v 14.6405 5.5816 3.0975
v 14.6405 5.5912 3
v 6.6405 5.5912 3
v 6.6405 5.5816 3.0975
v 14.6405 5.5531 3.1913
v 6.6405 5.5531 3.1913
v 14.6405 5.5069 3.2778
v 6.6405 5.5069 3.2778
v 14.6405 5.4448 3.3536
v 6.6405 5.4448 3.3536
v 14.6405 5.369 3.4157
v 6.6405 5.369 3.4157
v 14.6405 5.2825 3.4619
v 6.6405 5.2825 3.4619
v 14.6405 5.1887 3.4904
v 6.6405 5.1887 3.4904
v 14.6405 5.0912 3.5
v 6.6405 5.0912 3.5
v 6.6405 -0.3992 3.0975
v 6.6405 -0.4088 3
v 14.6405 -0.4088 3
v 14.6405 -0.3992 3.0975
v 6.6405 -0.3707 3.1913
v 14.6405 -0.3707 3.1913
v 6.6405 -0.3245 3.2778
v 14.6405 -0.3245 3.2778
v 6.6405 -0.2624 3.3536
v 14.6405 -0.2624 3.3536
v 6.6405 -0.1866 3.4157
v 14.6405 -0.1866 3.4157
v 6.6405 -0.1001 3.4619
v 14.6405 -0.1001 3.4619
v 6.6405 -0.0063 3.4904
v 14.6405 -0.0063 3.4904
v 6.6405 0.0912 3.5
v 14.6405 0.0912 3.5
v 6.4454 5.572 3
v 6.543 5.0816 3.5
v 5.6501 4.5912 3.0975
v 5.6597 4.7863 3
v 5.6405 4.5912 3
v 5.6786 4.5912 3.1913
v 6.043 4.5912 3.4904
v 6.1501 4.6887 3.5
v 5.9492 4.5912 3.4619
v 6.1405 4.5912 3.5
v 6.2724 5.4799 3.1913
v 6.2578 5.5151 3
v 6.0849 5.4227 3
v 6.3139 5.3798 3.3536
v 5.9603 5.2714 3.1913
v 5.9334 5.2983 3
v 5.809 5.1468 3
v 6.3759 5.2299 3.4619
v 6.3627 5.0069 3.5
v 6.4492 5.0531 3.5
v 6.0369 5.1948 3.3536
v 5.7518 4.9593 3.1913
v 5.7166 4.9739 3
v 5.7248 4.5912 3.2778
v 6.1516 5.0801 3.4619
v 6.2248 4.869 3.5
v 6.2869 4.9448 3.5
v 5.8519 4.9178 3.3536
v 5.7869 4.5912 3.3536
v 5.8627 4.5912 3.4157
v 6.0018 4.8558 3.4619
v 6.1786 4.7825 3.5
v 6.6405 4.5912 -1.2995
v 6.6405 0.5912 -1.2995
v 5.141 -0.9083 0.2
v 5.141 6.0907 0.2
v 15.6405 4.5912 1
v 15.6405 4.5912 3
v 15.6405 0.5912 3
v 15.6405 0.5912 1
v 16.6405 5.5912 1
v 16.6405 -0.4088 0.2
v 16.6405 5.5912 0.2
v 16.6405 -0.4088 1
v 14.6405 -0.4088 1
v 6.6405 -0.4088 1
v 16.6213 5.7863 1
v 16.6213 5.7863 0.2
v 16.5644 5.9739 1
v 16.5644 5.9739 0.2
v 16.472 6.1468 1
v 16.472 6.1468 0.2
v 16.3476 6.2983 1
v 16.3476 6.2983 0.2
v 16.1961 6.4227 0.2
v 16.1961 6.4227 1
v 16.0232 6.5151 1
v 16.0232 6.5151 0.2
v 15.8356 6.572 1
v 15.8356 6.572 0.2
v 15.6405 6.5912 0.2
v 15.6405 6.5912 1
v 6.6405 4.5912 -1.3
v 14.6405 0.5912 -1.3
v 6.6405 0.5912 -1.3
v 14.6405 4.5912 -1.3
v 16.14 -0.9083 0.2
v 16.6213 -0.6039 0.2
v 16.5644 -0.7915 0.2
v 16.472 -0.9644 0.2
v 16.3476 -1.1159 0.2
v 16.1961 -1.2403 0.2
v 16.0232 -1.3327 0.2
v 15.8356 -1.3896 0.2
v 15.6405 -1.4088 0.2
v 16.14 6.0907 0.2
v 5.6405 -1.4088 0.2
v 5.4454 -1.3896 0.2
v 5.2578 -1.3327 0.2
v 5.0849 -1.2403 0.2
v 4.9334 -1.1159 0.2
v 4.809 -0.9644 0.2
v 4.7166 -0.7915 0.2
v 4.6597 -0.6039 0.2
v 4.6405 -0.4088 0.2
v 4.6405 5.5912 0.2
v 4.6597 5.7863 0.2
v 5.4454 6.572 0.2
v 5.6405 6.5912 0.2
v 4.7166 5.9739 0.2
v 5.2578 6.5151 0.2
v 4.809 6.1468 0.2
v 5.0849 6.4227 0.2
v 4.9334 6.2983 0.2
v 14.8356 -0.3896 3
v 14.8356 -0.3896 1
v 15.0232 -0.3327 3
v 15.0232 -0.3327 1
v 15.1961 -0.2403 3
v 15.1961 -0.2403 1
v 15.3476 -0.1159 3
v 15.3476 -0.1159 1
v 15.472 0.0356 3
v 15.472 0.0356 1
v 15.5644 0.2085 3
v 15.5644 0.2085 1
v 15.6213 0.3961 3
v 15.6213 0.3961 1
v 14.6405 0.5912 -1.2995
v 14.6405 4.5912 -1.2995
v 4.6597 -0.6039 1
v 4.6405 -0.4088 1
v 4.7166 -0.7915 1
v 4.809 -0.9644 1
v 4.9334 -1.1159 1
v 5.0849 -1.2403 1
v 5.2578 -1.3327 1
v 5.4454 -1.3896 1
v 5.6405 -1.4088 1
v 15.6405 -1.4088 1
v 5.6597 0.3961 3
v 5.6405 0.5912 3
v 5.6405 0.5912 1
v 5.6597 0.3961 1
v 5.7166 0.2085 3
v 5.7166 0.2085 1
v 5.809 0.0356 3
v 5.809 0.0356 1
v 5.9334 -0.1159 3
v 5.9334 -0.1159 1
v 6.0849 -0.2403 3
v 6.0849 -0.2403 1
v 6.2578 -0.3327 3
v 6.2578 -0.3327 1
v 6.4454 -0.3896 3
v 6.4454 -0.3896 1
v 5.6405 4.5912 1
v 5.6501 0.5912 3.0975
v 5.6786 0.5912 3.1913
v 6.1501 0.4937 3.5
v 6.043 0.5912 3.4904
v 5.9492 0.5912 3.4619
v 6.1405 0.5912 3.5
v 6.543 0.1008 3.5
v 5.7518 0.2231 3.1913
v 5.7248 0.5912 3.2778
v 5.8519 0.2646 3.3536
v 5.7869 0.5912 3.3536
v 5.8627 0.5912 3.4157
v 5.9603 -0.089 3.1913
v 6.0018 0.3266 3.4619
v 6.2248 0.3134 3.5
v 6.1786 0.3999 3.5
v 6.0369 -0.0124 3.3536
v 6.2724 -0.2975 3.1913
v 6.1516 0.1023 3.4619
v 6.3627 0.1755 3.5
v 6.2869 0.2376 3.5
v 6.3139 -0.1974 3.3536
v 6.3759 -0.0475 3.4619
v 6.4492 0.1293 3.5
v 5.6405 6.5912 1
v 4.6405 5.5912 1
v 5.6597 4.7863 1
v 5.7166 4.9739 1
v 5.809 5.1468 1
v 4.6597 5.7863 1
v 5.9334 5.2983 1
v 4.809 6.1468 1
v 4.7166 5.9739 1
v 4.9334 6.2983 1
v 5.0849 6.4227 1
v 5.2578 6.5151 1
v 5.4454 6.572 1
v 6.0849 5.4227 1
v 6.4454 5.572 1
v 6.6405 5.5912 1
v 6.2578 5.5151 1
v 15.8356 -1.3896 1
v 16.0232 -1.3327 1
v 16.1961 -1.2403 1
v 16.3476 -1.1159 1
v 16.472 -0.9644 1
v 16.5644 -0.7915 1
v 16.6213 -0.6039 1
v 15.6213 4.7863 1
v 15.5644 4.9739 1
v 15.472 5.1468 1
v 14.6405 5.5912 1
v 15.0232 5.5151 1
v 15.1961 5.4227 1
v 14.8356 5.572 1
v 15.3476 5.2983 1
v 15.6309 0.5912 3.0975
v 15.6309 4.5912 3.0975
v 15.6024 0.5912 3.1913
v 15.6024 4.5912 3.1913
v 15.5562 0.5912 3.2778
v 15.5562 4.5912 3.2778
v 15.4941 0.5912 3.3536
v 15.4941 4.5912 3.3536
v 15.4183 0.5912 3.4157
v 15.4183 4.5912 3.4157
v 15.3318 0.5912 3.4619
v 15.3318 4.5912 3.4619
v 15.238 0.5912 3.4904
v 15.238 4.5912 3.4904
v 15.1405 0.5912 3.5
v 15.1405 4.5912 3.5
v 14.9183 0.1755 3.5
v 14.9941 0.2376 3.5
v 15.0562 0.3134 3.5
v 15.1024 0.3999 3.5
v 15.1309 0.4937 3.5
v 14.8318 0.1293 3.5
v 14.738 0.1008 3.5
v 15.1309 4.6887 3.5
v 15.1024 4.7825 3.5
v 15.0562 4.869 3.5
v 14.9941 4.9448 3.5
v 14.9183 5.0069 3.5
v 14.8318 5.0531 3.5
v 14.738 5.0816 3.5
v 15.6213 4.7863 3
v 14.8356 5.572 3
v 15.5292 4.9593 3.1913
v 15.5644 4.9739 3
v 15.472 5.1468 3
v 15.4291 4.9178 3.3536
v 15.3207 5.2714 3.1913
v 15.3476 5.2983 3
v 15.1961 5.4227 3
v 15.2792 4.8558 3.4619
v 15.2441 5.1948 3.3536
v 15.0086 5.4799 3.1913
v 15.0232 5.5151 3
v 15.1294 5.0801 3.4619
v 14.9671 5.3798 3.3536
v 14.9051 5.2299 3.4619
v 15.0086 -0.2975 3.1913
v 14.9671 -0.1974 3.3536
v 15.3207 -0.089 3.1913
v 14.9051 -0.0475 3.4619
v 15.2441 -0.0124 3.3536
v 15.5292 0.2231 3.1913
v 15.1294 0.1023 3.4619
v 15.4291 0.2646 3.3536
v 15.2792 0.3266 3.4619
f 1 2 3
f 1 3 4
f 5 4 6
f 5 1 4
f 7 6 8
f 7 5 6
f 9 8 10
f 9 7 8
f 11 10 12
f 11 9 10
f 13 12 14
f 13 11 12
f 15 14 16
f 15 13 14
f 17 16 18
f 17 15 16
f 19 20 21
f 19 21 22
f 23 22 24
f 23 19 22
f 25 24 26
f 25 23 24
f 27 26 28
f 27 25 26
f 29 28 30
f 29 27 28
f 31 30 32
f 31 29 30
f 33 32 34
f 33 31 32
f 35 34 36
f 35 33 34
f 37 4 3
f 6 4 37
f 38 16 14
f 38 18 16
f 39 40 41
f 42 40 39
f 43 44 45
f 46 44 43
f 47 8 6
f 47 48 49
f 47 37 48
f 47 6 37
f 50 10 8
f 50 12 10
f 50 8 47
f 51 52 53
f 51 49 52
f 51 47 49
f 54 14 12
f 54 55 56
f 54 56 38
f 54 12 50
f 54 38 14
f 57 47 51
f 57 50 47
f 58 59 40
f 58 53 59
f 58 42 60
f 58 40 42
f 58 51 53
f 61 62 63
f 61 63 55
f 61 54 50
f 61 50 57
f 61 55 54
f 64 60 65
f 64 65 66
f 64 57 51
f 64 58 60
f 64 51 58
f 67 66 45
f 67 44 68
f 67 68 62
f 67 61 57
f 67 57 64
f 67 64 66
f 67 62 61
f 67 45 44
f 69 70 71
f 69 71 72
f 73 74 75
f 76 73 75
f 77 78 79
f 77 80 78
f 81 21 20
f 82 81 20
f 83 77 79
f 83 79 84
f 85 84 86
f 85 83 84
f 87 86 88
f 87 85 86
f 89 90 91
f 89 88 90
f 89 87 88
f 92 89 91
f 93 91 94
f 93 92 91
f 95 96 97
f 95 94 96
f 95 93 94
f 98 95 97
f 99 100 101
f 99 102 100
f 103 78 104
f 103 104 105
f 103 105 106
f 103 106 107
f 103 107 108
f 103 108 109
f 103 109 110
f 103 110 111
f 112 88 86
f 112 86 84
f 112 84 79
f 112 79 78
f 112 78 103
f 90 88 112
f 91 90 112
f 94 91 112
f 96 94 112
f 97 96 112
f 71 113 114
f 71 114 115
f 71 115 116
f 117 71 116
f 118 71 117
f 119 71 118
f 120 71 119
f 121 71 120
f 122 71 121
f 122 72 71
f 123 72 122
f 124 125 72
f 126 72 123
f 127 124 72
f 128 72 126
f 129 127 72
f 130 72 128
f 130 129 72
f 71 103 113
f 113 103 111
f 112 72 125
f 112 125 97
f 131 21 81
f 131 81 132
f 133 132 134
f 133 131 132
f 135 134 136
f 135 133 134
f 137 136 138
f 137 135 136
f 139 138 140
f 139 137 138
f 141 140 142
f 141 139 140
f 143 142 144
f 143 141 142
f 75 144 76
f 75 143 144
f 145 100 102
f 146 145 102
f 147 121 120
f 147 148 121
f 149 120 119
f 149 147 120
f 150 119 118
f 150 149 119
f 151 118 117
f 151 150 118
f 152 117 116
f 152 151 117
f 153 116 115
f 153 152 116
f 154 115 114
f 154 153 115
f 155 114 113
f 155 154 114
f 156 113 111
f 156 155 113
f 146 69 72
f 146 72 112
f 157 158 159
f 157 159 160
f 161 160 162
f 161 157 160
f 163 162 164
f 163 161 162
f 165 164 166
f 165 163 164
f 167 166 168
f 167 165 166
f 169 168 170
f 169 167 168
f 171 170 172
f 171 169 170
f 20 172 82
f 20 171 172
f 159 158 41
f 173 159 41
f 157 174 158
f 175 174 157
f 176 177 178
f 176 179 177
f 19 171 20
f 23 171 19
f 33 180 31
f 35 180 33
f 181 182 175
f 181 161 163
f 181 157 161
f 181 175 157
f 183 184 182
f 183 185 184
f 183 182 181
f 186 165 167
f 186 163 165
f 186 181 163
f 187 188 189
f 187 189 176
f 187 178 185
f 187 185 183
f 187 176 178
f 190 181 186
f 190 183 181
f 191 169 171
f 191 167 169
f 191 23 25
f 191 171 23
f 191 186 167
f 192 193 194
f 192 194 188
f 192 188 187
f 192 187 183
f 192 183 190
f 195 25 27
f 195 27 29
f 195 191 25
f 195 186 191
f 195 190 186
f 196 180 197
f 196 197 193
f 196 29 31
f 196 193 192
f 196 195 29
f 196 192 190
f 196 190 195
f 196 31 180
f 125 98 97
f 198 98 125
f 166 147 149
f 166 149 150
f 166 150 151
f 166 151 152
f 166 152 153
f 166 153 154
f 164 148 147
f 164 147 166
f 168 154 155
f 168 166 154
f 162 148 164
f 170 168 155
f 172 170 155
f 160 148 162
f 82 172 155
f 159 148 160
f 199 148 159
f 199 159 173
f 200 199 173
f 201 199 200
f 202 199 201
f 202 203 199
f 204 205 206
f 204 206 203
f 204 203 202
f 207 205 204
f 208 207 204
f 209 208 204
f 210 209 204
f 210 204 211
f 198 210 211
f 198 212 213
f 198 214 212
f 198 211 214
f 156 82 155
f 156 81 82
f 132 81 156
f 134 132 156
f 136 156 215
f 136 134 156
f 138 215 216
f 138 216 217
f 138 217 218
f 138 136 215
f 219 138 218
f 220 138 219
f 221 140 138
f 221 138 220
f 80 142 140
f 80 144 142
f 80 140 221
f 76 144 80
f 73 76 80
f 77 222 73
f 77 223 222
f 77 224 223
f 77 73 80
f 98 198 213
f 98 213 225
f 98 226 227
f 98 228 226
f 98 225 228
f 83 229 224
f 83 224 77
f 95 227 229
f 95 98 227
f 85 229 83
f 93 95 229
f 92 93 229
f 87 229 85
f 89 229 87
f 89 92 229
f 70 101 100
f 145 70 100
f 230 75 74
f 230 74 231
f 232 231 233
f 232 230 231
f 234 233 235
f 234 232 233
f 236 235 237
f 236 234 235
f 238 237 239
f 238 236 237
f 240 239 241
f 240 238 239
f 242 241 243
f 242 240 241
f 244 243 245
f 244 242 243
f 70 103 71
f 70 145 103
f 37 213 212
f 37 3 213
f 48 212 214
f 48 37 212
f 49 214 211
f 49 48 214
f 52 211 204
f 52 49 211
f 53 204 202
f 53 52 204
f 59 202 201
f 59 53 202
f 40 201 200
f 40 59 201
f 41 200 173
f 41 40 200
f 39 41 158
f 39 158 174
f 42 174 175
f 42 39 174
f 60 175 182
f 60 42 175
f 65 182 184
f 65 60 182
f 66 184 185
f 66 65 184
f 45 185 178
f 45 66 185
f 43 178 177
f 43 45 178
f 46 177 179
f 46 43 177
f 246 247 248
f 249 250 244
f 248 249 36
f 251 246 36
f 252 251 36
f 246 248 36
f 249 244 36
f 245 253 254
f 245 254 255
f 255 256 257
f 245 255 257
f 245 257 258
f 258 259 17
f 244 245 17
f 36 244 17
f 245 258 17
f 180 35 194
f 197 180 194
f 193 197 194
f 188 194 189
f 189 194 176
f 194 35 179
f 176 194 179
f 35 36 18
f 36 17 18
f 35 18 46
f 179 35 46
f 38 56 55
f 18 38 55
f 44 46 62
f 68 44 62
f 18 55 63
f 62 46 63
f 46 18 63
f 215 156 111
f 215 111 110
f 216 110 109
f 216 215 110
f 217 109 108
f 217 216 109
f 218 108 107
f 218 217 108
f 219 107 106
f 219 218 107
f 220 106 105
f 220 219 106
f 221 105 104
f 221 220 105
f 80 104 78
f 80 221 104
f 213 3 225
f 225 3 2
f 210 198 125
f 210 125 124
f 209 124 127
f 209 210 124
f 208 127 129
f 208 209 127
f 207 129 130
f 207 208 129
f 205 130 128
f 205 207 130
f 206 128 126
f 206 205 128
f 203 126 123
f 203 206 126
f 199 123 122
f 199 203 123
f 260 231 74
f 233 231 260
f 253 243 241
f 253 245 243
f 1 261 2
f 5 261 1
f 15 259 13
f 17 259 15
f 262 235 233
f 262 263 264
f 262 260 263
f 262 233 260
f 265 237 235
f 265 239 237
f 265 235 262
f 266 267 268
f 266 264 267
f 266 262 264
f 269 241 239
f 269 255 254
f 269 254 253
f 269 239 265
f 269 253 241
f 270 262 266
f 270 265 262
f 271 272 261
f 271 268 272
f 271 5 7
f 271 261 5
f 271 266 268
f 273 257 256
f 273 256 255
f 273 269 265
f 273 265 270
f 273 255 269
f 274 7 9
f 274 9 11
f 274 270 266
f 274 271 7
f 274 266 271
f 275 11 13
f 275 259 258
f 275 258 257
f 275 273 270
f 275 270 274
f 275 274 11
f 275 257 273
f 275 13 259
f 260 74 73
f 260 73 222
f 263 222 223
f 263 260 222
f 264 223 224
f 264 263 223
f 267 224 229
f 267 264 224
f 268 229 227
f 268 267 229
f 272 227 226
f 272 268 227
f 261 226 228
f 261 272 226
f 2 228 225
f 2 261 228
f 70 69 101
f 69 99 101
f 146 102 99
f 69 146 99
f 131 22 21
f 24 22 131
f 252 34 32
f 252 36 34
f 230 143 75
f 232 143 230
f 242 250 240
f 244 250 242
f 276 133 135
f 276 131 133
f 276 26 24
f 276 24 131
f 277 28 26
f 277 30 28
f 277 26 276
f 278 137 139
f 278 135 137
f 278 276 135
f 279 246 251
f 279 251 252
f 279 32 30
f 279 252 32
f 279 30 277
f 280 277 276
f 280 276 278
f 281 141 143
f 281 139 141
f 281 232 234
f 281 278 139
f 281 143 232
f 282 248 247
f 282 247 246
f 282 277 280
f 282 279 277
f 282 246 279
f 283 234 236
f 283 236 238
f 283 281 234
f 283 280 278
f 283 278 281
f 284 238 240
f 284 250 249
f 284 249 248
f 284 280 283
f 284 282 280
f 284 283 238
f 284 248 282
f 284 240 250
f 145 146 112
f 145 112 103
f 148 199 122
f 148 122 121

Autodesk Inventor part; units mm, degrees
ref_plane "YZ Plane" through (0, 0, 0) normal (1, 0, 0) x (0, 1, 0)
ref_plane "XZ Plane" through (0, 0, 0) normal (0, 1, 0) x (-1, 0, 0)
ref_plane "XY Plane" through (0, 0, 0) normal (0, 0, 1) x (1, 0, 0)
sketch "Sketch1" plane through (0, 0, 0) normal (0, 0, 1) x (1, 0, 0)
  circle A0 centre (10.6405, 2.5912) radius 4
  line L0 (15.6405, 6.5912) -> (5.6405, 6.5912)
  line L1 (4.6405, 5.5912) -> (4.6405, -0.4088)
  line L2 (5.6405, -1.4088) -> (15.6405, -1.4088)
  line L3 (16.6405, -0.4088) -> (16.6405, 5.5912)
  line L4 (16.6405, 6.5912) -> (4.6405, -1.4088) construction
  line L5 (4.6405, 6.5912) -> (16.6405, -1.4088) construction
  arc A1 (5.6405, 6.5912) -> (4.6405, 5.5912) centre (5.6405, 5.5912) ccw
  arc A2 (4.6405, -0.4088) -> (5.6405, -1.4088) centre (5.6405, -0.4088) ccw
  arc A3 (15.6405, -1.4088) -> (16.6405, -0.4088) centre (15.6405, -0.4088) ccw
  arc A4 (16.6405, 5.5912) -> (15.6405, 6.5912) centre (15.6405, 5.5912) ccw
  point P0 (0, 0)
  point P1 (10.6405, 6.5912)
  point P2 (10.6405, -1.4088)
  dimension "d6" = 8
  dimension "d13" = 8
  dimension "d14" = 12
  dimension "d15" = 1
extrude "Extrusion1" add sketch "Sketch1" along normal blind 1
sketch "Sketch2" plane through (10.6405, 2.5912, 0) normal (0, 0, -1) x (-1, 0, 0)
  circle A0 centre (0, 0) radius 3
  line L0 (5, -4) -> (-5, -4) projected
  arc A1 (-6, -3) -> (-5, -4) centre (-5, -3) ccw projected
  line L1 (-6, -3) -> (-6, 3) projected
  arc A2 (-5, 4) -> (-6, 3) centre (-5, 3) ccw projected
  line L2 (-5, 4) -> (5, 4) projected
  arc A3 (6, 3) -> (5, 4) centre (5, 3) ccw projected
  line L3 (6, 3) -> (6, -3) projected
  arc A4 (5, -4) -> (6, -3) centre (5, -3) ccw projected
  line L4 (-4, -3) -> (4, -3)
  line L5 (5, -2) -> (5, 2)
  line L6 (4, 3) -> (-4, 3)
  line L7 (-5, 2) -> (-5, -2)
  arc A5 (5, 2) -> (4, 3) centre (4, 2) ccw
  arc A6 (4, -3) -> (5, -2) centre (4, -2) ccw
  arc A7 (-5, -2) -> (-4, -3) centre (-4, -2) ccw
  arc A8 (-4, 3) -> (-5, 2) centre (-4, 2) ccw
  point P0 (10.6405, -2.5912)
  point P1 (0, 3)
  point P2 (0, -3)
  dimension "d16" = 1
  dimension "d17" = 1
extrude "Extrusion2" add sketch "Sketch2" along normal blind 1.3 and the other way blind 3.5 contours A0 | A0 L6 A5 L5 A6 L4 | A0 L4 A7 L7 A8 L6
fillet "Fillet3" radius 0.5 10 edges at (15.3476, -0.1159, 3.5) (15.6405, 2.5912, 3.5) (15.3476, 5.2983, 3.5) (12.6405, 5.5912, 3.5) (8.6405, 5.5912, 3.5) (5.9334, 5.2983, 3.5) (5.6405, 2.5912, 3.5) (5.9334, -0.1159, 3.5) (8.6405, -0.4088, 3.5) (12.6405, -0.4088, 3.5)
sketch "Sketch4" plane through (0, 0, 0) normal (0, 0, -1) x (-1, 0, 0)
  point P0 (0, 0)
sketch "Sketch6" plane through (0, 0, 0) normal (0, 0, -1) x (-1, 0, 0)
  arc A0 (-15.6405, 0.5912) -> (-14.6405, -0.4088) centre (-14.6405, 0.5912) ccw projected
  line L0 (-15.6405, 0.5912) -> (-15.6405, 4.5912) projected
  arc A1 (-14.6405, 5.5912) -> (-15.6405, 4.5912) centre (-14.6405, 4.5912) ccw projected
  line L1 (-14.6405, 5.5912) -> (-6.6405, 5.5912) projected
  arc A2 (-5.6405, 4.5912) -> (-6.6405, 5.5912) centre (-6.6405, 4.5912) ccw projected
  line L2 (-5.6405, 4.5912) -> (-5.6405, 0.5912) projected
  arc A3 (-6.6405, -0.4088) -> (-5.6405, 0.5912) centre (-6.6405, 0.5912) ccw projected
  line L3 (-6.6405, -0.4088) -> (-14.6405, -0.4088) projected
  line L4 (-5.6405, -1.4088) -> (-15.6405, -1.4088) projected
  arc A4 (-5.6405, -1.4088) -> (-4.6405, -0.4088) centre (-5.6405, -0.4088) ccw projected
  line L5 (-4.6405, 5.5912) -> (-4.6405, -0.4088) projected
  arc A5 (-4.6405, 5.5912) -> (-5.6405, 6.5912) centre (-5.6405, 5.5912) ccw projected
  line L6 (-15.6405, 6.5912) -> (-5.6405, 6.5912) projected
  arc A6 (-15.6405, 6.5912) -> (-16.6405, 5.5912) centre (-15.6405, 5.5912) ccw projected
  line L7 (-16.6405, -0.4088) -> (-16.6405, 5.5912) projected
  arc A7 (-16.6405, -0.4088) -> (-15.6405, -1.4088) centre (-15.6405, -0.4088) ccw projected
  point P0 (0, 0)
extrude "Extrusion5" add sketch "Sketch6" along normal up to surface (1.3 mm away)
sketch "Sketch7" plane through (10.6405, 2.5912, -1.3) normal (0, 0, -1) x (-1, 0, 0)
  arc A0 (6, 3) -> (5, 4) centre (5, 3) ccw projected
  line L0 (-5, 4) -> (5, 4) projected
  arc A1 (-5, 4) -> (-6, 3) centre (-5, 3) ccw projected
  line L1 (-6, -3) -> (-6, 3) projected
  arc A2 (-6, -3) -> (-5, -4) centre (-5, -3) ccw projected
  line L2 (5, -4) -> (-5, -4) projected
  arc A3 (5, -4) -> (6, -3) centre (5, -3) ccw projected
  line L3 (6, 3) -> (6, -3) projected
  line L4 (4, -2) -> (-4, -2)
  line L5 (-4, -2) -> (-4, 2)
  line L6 (-4, 2) -> (4, 2)
  line L7 (4, 2) -> (4, -2)
  point P0 (10.6405, -2.5912)
  dimension "d28" = 2
extrude "Extrusion6" cut sketch "Sketch7" against normal blind 1.5
chamfer "Chamfer2" distance 1.5 angle 45 4 edges at (10.6405, 0.5912, 0.2) (6.6405, 2.5912, 0.2) (10.6405, 4.5912, 0.2) (14.6405, 2.5912, 0.2)
properties part number "button_3DPrint"
